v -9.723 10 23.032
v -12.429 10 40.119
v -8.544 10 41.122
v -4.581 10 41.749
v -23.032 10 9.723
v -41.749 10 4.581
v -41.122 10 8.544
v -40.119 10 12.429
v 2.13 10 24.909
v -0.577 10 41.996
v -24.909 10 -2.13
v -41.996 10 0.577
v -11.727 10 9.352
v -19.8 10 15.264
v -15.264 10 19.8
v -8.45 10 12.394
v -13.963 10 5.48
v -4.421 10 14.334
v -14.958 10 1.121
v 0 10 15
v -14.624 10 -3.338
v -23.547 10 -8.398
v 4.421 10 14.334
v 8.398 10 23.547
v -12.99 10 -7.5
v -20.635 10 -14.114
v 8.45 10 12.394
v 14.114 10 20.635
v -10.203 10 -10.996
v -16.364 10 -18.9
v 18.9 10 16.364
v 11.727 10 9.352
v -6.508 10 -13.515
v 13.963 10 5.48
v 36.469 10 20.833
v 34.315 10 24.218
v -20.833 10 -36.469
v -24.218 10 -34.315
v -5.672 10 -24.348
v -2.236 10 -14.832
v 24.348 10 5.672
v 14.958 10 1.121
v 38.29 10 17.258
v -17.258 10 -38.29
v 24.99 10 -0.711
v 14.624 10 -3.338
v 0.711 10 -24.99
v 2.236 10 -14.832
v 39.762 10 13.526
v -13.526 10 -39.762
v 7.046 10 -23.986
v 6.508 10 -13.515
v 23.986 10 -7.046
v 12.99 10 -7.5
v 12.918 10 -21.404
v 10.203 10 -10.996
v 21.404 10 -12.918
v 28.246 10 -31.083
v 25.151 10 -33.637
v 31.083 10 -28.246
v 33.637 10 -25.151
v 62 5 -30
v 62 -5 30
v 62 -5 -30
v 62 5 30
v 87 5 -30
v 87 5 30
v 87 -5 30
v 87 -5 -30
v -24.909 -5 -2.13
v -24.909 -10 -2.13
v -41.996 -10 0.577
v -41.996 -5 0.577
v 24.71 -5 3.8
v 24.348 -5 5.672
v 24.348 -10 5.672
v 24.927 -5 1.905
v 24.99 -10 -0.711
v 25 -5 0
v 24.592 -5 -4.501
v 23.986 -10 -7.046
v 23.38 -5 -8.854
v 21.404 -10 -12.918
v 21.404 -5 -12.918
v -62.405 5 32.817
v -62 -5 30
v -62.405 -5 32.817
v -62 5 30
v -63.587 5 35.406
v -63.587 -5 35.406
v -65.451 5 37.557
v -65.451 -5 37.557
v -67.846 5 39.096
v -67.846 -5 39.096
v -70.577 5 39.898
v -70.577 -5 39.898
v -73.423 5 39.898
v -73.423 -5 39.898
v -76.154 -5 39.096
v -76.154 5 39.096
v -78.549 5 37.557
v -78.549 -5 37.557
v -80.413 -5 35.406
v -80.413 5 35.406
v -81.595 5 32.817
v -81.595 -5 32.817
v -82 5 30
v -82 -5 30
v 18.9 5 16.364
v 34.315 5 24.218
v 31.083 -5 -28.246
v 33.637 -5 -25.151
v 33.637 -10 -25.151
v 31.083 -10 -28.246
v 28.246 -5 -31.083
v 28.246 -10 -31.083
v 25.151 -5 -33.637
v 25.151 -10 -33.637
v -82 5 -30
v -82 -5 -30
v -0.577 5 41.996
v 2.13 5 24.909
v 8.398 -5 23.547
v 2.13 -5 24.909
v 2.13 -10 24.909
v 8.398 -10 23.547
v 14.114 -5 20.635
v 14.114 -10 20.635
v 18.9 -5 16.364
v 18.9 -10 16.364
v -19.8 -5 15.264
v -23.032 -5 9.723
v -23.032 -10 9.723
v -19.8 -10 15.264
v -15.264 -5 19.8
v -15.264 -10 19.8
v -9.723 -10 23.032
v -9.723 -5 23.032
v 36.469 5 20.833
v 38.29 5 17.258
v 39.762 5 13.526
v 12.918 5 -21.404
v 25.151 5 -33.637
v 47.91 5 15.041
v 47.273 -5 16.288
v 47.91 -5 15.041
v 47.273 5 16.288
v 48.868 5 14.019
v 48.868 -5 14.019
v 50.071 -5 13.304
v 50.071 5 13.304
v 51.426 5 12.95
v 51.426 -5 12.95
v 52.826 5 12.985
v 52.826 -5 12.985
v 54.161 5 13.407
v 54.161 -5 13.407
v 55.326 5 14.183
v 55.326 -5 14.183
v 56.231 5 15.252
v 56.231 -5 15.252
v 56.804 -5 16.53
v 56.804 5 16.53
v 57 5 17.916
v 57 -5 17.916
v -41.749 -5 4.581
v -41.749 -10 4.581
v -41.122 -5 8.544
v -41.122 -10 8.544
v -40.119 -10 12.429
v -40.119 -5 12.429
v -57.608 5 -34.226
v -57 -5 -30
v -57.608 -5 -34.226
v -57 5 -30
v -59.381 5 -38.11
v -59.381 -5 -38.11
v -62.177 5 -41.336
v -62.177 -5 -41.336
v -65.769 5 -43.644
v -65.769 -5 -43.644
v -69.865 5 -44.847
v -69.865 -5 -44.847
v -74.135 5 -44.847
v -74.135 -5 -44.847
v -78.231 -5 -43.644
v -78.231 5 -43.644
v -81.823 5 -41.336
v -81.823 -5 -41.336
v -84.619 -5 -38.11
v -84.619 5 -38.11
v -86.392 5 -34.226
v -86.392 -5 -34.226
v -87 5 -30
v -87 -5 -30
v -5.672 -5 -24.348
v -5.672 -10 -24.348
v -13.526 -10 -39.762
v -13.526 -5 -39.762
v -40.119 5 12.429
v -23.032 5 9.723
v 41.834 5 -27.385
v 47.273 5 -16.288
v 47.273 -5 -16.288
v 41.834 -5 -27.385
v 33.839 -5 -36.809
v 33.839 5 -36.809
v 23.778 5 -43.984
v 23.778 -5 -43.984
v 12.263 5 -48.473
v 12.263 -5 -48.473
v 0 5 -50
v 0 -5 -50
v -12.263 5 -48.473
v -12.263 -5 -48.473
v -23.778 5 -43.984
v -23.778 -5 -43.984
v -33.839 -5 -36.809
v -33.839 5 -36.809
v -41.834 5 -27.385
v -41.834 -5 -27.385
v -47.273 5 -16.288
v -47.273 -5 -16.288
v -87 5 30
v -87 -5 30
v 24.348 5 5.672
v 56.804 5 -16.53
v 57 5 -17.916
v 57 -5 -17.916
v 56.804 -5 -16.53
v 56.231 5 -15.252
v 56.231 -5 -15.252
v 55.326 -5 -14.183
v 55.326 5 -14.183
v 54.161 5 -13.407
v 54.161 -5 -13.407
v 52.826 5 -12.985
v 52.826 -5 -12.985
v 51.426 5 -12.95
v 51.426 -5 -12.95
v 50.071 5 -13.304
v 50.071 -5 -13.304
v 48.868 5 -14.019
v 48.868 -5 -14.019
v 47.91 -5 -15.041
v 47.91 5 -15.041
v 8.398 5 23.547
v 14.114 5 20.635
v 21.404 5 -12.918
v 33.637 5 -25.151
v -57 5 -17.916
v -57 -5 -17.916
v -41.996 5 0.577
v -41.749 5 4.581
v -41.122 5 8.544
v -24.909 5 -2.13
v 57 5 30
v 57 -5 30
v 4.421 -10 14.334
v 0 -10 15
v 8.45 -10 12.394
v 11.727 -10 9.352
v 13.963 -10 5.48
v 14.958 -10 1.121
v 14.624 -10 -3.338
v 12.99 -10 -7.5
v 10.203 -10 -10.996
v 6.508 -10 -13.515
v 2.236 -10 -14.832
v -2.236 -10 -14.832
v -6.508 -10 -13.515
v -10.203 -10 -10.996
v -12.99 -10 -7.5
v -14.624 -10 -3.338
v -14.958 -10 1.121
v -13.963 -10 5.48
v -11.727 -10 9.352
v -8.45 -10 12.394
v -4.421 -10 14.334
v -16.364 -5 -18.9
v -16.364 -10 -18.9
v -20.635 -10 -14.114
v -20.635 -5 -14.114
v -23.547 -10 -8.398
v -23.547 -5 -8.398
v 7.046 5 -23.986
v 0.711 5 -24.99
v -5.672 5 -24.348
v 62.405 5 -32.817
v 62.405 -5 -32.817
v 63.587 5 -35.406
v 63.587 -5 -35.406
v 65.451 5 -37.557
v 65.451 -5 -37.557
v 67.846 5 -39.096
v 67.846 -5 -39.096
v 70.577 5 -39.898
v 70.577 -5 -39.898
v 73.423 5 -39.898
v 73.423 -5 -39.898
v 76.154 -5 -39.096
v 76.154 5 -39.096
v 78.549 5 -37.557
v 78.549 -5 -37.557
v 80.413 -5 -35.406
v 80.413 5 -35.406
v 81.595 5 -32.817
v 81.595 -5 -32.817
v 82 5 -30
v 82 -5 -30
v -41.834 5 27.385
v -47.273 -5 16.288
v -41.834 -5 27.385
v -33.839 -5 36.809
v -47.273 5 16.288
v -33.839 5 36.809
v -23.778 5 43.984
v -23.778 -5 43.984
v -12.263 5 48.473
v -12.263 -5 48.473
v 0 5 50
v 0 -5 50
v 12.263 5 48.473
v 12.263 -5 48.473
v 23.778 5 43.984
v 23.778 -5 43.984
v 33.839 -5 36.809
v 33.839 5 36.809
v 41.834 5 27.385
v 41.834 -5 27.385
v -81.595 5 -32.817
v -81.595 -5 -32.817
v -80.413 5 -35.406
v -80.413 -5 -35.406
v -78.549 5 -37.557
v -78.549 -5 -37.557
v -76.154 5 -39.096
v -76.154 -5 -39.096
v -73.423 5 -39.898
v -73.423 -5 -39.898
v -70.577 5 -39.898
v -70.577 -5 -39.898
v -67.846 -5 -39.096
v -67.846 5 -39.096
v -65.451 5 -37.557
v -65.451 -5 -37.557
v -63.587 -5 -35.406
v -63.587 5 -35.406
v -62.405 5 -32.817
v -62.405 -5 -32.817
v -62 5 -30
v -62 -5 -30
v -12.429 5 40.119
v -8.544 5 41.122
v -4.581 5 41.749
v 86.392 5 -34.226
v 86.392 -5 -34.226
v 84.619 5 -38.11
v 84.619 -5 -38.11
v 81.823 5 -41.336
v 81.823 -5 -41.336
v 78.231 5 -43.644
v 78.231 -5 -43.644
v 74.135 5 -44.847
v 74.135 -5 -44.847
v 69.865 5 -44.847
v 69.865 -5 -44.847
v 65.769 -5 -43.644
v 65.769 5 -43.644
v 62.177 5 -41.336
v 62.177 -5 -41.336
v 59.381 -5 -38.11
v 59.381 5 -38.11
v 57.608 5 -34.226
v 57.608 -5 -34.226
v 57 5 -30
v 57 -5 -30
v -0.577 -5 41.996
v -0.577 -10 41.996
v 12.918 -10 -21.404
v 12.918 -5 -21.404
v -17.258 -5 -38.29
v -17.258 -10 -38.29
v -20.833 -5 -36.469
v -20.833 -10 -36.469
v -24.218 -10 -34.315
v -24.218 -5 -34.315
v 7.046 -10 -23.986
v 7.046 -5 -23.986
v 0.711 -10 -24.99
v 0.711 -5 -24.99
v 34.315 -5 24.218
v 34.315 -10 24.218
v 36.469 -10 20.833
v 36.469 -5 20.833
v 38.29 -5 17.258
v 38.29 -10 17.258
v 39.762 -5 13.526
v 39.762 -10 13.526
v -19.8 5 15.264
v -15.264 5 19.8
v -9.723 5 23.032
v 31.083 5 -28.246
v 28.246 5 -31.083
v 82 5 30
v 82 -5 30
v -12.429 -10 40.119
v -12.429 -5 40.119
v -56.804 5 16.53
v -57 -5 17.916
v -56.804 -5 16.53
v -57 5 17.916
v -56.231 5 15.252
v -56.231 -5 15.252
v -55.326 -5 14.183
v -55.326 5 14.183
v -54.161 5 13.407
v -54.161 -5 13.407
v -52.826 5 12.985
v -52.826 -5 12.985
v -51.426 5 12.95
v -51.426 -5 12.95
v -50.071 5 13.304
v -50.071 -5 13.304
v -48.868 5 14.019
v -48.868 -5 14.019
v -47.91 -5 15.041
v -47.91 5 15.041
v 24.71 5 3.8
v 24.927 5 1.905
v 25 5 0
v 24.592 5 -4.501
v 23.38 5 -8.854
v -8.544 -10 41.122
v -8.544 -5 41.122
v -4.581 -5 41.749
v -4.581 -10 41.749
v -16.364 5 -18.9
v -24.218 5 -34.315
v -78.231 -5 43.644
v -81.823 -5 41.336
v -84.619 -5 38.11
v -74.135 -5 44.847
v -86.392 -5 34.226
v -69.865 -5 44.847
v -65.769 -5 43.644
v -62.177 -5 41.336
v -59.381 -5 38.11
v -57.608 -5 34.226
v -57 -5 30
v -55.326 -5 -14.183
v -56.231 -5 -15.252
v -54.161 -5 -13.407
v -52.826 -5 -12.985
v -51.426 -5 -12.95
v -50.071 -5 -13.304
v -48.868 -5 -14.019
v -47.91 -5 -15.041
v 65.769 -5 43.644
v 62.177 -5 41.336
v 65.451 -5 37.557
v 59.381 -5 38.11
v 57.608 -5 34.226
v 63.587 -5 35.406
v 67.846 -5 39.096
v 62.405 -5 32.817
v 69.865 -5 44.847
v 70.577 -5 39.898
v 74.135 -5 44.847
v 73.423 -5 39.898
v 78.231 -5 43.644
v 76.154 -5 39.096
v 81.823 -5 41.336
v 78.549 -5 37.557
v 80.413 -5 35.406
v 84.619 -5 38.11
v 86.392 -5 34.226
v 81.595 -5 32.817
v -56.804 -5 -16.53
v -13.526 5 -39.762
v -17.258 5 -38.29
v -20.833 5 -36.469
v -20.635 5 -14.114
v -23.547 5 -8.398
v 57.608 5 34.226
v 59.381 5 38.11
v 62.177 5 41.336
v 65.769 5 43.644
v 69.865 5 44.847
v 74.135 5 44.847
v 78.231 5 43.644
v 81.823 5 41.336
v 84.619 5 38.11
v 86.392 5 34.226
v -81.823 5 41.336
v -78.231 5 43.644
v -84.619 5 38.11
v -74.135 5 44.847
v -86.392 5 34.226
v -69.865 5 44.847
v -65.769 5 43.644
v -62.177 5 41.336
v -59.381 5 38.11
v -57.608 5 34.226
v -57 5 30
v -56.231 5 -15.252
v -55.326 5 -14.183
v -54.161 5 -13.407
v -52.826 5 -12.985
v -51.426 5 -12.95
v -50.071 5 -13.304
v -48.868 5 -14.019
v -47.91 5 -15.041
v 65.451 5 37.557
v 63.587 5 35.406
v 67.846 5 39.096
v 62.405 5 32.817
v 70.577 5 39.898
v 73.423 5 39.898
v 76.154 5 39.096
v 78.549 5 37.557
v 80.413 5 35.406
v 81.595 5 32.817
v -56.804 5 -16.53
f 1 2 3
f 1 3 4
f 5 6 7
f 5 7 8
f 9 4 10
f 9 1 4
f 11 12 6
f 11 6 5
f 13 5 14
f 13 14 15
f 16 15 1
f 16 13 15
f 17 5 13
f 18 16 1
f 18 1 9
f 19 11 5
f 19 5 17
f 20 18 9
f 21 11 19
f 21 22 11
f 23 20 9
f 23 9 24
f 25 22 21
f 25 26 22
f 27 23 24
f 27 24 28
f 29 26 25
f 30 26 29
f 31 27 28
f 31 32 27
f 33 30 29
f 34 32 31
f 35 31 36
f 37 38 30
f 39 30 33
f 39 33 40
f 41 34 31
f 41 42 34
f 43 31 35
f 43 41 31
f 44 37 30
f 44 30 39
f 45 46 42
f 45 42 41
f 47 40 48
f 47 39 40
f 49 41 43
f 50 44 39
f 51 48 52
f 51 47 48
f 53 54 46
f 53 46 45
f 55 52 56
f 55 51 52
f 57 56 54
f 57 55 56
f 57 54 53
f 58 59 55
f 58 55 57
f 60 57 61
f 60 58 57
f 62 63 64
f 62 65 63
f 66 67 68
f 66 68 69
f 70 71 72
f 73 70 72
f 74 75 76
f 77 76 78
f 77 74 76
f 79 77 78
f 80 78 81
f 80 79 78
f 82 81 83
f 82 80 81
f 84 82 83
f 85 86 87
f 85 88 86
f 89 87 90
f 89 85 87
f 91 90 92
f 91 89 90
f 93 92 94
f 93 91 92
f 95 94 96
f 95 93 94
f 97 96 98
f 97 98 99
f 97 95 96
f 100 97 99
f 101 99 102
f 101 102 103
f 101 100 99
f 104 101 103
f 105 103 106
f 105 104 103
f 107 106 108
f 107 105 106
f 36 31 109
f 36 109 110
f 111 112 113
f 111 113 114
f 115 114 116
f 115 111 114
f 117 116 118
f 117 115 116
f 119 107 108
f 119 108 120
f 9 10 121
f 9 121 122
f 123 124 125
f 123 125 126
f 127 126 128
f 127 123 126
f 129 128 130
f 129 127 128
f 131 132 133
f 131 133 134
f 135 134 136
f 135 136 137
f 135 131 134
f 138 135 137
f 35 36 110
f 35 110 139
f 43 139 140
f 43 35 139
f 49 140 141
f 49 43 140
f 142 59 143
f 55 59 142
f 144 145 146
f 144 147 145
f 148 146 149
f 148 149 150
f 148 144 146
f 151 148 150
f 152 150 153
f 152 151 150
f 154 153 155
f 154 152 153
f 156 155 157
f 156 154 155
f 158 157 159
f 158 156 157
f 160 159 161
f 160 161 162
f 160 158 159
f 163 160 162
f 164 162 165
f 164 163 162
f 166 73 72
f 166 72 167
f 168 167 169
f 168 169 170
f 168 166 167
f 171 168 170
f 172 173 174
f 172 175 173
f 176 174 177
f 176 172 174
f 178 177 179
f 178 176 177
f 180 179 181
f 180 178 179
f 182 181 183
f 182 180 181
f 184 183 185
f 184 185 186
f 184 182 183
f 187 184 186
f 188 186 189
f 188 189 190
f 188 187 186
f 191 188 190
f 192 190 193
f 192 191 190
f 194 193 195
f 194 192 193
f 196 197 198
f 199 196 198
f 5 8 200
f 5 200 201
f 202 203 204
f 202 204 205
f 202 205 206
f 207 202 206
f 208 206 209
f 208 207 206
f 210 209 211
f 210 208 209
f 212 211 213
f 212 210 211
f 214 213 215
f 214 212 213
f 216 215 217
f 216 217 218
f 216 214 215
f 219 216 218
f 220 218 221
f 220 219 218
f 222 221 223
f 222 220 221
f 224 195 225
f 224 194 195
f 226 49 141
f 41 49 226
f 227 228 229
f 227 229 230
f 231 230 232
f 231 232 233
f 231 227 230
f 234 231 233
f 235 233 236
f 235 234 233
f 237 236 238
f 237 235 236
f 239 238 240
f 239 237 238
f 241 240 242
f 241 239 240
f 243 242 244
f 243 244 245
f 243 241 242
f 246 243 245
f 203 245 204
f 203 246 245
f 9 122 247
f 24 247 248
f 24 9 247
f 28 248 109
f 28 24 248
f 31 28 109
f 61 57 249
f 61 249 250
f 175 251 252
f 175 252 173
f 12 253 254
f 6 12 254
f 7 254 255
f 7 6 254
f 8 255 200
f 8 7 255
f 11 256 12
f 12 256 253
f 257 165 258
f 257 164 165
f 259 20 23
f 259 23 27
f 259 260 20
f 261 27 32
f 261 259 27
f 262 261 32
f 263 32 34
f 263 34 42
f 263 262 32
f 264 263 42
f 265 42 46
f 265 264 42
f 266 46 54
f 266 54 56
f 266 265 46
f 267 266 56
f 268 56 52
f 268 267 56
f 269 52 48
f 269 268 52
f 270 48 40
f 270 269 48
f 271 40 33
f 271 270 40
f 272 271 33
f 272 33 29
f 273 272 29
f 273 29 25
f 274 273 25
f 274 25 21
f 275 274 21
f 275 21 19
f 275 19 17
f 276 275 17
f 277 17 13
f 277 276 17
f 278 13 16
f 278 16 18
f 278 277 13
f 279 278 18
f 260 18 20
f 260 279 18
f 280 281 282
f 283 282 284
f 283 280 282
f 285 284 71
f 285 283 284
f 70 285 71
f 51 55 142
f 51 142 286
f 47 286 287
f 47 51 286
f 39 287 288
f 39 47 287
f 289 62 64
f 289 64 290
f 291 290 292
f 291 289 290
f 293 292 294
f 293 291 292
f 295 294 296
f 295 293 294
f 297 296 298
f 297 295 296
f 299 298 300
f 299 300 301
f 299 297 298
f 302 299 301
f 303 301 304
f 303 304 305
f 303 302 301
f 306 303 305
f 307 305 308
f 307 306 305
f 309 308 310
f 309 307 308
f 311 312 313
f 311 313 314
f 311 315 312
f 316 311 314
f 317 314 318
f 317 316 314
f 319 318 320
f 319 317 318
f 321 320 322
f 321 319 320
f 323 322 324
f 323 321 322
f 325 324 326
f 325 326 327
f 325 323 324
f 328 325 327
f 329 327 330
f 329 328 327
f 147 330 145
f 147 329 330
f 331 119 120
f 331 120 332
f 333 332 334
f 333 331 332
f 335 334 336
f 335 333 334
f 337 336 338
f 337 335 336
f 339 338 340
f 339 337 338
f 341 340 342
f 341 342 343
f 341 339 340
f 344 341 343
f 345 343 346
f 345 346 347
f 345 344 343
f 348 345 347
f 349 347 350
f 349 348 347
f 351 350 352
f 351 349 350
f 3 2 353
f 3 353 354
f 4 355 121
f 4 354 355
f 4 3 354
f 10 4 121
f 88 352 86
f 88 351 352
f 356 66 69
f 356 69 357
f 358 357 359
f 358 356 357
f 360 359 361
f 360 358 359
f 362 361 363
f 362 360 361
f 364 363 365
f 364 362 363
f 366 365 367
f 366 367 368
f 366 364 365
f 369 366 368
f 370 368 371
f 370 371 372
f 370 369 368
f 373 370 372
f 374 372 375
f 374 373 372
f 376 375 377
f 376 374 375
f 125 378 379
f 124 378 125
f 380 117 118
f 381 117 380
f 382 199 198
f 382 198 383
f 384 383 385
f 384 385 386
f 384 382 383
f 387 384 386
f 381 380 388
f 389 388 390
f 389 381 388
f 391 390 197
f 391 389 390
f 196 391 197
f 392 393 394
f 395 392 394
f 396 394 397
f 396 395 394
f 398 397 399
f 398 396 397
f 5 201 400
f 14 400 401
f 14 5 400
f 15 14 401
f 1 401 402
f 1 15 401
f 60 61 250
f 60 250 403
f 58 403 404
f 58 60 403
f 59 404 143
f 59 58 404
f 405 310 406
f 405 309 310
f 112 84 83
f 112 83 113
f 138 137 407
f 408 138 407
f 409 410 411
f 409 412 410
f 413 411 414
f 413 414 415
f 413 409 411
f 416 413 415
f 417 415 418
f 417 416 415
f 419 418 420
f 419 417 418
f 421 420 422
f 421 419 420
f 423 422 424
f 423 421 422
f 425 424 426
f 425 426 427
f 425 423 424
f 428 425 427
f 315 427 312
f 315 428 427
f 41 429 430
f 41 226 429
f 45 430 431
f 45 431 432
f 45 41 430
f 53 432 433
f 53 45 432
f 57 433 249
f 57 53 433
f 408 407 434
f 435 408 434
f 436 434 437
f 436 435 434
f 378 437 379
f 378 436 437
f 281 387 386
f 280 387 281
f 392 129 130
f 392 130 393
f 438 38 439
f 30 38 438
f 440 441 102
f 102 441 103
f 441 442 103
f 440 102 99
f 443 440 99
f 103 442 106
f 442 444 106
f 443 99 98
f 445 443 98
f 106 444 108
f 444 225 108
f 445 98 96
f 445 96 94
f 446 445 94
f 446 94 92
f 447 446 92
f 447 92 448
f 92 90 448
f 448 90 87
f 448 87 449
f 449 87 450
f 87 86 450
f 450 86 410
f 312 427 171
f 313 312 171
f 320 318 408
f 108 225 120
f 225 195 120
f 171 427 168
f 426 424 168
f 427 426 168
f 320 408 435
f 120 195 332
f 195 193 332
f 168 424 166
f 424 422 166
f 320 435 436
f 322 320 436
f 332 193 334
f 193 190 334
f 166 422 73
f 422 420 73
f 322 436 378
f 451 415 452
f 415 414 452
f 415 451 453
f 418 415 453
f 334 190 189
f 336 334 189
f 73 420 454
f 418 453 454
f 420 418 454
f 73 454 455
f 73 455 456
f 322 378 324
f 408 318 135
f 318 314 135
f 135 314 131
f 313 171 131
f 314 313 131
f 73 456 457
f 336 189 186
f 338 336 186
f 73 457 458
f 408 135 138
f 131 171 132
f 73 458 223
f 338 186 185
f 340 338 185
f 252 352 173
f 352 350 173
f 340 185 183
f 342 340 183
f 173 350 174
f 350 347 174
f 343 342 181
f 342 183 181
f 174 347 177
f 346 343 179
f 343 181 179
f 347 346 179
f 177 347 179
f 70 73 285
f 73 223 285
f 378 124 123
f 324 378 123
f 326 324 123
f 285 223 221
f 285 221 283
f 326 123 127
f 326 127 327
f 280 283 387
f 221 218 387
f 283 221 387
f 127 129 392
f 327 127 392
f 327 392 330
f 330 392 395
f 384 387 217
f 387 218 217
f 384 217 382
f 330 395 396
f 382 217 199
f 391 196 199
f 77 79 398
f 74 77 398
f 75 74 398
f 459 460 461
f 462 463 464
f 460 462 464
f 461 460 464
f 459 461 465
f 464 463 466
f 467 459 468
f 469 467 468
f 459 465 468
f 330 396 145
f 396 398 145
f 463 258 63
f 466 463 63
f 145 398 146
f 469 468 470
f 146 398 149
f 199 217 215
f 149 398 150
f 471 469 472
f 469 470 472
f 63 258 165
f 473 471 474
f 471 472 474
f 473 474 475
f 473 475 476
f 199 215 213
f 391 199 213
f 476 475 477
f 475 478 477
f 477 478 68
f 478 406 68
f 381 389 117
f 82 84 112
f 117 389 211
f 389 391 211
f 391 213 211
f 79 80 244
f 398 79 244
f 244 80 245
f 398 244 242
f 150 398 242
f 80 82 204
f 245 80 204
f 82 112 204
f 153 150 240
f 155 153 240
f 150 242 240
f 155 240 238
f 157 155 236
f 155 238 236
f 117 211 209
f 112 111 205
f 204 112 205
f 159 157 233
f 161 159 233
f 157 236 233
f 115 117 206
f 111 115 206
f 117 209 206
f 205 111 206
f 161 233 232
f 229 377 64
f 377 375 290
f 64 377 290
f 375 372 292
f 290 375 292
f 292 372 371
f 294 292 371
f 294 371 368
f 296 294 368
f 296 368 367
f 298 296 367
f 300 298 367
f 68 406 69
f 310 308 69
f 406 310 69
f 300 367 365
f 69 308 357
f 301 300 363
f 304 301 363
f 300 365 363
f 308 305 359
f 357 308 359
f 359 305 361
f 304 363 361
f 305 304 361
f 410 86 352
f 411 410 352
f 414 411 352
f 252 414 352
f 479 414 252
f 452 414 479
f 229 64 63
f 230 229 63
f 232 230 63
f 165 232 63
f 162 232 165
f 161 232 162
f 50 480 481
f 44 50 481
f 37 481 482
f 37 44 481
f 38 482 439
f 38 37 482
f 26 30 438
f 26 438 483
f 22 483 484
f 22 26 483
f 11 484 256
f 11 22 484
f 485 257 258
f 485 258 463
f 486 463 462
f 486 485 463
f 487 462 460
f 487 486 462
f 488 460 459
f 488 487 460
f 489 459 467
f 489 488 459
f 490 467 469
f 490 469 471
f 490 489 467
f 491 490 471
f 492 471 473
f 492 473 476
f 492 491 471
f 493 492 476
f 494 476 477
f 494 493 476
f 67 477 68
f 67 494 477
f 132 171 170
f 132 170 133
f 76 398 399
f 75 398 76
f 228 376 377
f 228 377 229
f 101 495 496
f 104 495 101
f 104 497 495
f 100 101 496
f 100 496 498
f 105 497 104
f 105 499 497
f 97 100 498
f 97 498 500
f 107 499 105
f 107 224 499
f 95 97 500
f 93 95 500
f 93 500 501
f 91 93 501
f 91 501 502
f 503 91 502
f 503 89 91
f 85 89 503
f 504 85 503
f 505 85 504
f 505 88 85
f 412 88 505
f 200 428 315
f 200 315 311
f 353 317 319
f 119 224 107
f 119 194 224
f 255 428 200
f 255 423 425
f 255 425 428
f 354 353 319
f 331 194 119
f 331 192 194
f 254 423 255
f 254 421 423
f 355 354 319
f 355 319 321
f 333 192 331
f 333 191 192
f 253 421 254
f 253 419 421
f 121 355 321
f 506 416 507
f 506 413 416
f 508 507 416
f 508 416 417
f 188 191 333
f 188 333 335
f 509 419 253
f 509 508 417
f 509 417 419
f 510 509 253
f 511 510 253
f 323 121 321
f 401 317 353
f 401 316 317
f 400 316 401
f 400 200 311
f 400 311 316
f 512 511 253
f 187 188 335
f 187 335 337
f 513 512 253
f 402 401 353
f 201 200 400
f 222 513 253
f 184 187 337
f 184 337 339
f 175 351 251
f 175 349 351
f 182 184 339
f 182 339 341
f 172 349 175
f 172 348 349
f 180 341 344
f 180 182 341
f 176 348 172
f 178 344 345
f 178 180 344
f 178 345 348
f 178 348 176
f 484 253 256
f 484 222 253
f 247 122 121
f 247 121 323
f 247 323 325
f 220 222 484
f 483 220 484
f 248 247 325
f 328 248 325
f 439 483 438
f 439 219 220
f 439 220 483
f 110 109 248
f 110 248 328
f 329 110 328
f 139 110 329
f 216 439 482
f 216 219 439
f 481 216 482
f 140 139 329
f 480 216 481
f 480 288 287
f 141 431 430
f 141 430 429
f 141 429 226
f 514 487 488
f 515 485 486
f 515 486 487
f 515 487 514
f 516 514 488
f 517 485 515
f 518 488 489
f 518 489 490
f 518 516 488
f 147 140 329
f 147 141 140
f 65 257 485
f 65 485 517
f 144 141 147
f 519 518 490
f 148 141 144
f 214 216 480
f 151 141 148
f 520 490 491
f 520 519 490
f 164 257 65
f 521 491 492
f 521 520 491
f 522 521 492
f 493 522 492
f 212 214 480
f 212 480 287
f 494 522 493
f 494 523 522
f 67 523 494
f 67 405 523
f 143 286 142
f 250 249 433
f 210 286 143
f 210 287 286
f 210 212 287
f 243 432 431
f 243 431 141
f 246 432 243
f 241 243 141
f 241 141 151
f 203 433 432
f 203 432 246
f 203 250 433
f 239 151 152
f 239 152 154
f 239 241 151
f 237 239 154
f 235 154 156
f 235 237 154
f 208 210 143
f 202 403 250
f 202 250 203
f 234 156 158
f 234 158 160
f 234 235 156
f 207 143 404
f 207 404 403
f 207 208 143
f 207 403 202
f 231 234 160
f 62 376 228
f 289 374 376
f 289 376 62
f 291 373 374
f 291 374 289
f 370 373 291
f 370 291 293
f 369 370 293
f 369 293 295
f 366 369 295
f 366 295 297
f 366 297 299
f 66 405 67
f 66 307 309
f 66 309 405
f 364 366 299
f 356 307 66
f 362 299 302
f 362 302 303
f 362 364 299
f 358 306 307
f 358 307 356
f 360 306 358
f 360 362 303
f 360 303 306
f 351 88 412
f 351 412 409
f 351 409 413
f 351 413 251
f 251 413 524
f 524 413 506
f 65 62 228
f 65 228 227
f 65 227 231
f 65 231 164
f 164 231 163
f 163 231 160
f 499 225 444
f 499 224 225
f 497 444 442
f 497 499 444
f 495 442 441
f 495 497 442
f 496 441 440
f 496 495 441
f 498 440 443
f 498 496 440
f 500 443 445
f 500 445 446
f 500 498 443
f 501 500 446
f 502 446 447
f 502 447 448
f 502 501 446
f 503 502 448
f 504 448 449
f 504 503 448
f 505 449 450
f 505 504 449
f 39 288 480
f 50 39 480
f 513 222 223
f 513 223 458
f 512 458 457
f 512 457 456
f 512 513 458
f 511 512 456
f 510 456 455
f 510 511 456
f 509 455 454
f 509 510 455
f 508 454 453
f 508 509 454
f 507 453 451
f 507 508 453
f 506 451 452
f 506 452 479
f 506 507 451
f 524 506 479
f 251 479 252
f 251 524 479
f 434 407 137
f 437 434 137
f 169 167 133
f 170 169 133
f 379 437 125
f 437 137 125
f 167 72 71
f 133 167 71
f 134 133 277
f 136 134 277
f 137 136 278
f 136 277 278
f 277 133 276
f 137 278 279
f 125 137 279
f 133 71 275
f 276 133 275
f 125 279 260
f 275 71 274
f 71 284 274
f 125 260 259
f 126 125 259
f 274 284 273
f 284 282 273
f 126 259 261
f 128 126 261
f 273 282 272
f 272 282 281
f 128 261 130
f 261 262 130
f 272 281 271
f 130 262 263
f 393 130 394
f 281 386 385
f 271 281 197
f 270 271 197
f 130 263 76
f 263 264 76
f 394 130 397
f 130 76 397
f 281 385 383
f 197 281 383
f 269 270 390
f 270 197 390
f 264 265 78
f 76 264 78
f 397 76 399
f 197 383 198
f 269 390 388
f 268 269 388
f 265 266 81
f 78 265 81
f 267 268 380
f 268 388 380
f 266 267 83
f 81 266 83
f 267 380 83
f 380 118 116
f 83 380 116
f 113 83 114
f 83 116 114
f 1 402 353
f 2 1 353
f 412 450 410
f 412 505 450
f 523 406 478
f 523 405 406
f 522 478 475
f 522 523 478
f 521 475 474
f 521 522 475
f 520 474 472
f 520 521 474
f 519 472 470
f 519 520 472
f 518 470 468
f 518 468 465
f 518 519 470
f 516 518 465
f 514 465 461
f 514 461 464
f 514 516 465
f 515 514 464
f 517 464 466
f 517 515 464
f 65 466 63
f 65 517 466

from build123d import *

# Parameters (mm, degrees)
SKETCH1_R           = 15
BOSS_EXTRUDE1_DEPTH = 10
BOSS_EXTRUDE2_DEPTH = 5


with BuildPart() as part:
    # Sketch1 → Boss-Extrude1 (new, symmetric)
    with BuildSketch(Plane(origin=(0, 0, 0), x_dir=(1, 0, 0), z_dir=(0, 1, 0))):
        with BuildLine():
            Line((25.151236226, 33.636517601), (12.918361615, 21.403642989))
            ThreePointArc((12.918361615, 21.403642989), (3.910861626, 24.692208515), (-5.672002568, 24.348067415))
            Line((-5.672002568, 24.348067415), (-13.525991536, 39.762388673))
            ThreePointArc((-13.525991536, 39.762388673), (-19.067600989, 37.422274016), (-24.218069826, 34.314502676))
            Line((-24.218069826, 34.314502676), (-16.364080859, 18.900181419))
            ThreePointArc((-16.364080859, 18.900181419), (-22.275163105, 11.349762493), (-24.90913336, 2.129571608))
            Line((-24.90913336, 2.129571608), (-41.996040101, -0.576728553))
            ThreePointArc((-41.996040101, -0.576728553), (-41.482910305, -6.570247532), (-40.118826521, -12.42898864))
            Line((-40.118826521, -12.42898864), (-23.03191978, -9.722688479))
            ThreePointArc((-23.03191978, -9.722688479), (-17.67766953, -17.67766953), (-9.722688479, -23.03191978))
            Line((-9.722688479, -23.03191978), (-12.42898864, -40.118826521))
            ThreePointArc((-12.42898864, -40.118826521), (-6.570247532, -41.482910305), (-0.576728553, -41.996040101))
            Line((-0.576728553, -41.996040101), (2.129571608, -24.90913336))
            ThreePointArc((2.129571608, -24.90913336), (11.349762493, -22.275163105), (18.900181419, -16.364080859))
            Line((18.900181419, -16.364080859), (34.314502676, -24.218069826))
            ThreePointArc((34.314502676, -24.218069826), (37.422274016, -19.067600989), (39.762388673, -13.525991536))
            Line((39.762388673, -13.525991536), (24.348067415, -5.672002568))
            ThreePointArc((24.348067415, -5.672002568), (24.692208515, 3.910861626), (21.403642989, 12.918361615))
            Line((21.403642989, 12.918361615), (33.636517601, 25.151236226))
            ThreePointArc((33.636517601, 25.151236226), (29.69848481, 29.69848481), (25.151236226, 33.636517601))
        make_face()
        Circle(SKETCH1_R, mode=Mode.SUBTRACT)
    extrude(amount=BOSS_EXTRUDE1_DEPTH, both=True)

    # Sketch1<3> → Boss-Extrude2 (add, symmetric)
    with BuildSketch(Plane(origin=(0, 0, 0), x_dir=(1, 0, 0), z_dir=(0, 1, 0))):
        with BuildLine():
            Line((57, -17.916472867), (57, -30))
            ThreePointArc((57, -30), (72, -45), (87, -30))
            Line((87, -30), (87, 30))
            ThreePointArc((87, 30), (72, 45), (57, 30))
            Line((57, 30), (57, 17.916472867))
            ThreePointArc((57, 17.916472867), (52.825722824, 12.985126011), (47.272727273, 16.287702607))
            ThreePointArc((47.272727273, 16.287702607), (0, 50), (-47.272727273, 16.287702607))
            ThreePointArc((-47.272727273, 16.287702607), (-52.825722824, 12.985126011), (-57, 17.916472867))
            Line((-57, 17.916472867), (-57, 30))
            ThreePointArc((-57, 30), (-72, 45), (-87, 30))
            Line((-87, 30), (-87, -30))
            ThreePointArc((-87, -30), (-72, -45), (-57, -30))
            Line((-57, -30), (-57, -17.916472867))
            ThreePointArc((-57, -17.916472867), (-52.825722824, -12.985126011), (-47.272727273, -16.287702607))
            ThreePointArc((-47.272727273, -16.287702607), (0, -50), (47.272727273, -16.287702607))
            ThreePointArc((47.272727273, -16.287702607), (52.825722824, -12.985126011), (57, -17.916472867))
        make_face()
        with BuildLine():
            Line((-82, -30), (-82, 30))
            ThreePointArc((-82, 30), (-72, 40), (-62, 30))
            Line((-62, 30), (-62, -30))
            ThreePointArc((-62, -30), (-72, -40), (-82, -30))
        make_face(mode=Mode.SUBTRACT)
        with BuildLine():
            Line((33.636517601, 25.151236226), (21.403642989, 12.918361615))
            ThreePointArc((21.403642989, 12.918361615), (24.084134557, 6.704808919), (25, 0))
            ThreePointArc((25, 0), (24.836482092, -2.85467289), (24.348067415, -5.672002568))
            Line((24.348067415, -5.672002568), (39.762388673, -13.525991536))
            ThreePointArc((39.762388673, -13.525991536), (37.422274016, -19.067600989), (34.314502676, -24.218069826))
            Line((34.314502676, -24.218069826), (18.900181419, -16.364080859))
            ThreePointArc((18.900181419, -16.364080859), (11.349762493, -22.275163105), (2.129571608, -24.90913336))
            Line((2.129571608, -24.90913336), (-0.576728553, -41.996040101))
            ThreePointArc((-0.576728553, -41.996040101), (-6.570247532, -41.482910305), (-12.42898864, -40.118826521))
            Line((-12.42898864, -40.118826521), (-9.722688479, -23.03191978))
            ThreePointArc((-9.722688479, -23.03191978), (-17.67766953, -17.67766953), (-23.03191978, -9.722688479))
            Line((-23.03191978, -9.722688479), (-40.118826521, -12.42898864))
            ThreePointArc((-40.118826521, -12.42898864), (-41.482910305, -6.570247532), (-41.996040101, -0.576728553))
            Line((-41.996040101, -0.576728553), (-24.90913336, 2.129571608))
            ThreePointArc((-24.90913336, 2.129571608), (-22.275163105, 11.349762493), (-16.364080859, 18.900181419))
            Line((-16.364080859, 18.900181419), (-24.218069826, 34.314502676))
            ThreePointArc((-24.218069826, 34.314502676), (-19.067600989, 37.422274016), (-13.525991536, 39.762388673))
            Line((-13.525991536, 39.762388673), (-5.672002568, 24.348067415))
            ThreePointArc((-5.672002568, 24.348067415), (3.910861626, 24.692208515), (12.918361615, 21.403642989))
            Line((12.918361615, 21.403642989), (25.151236226, 33.636517601))
            ThreePointArc((25.151236226, 33.636517601), (29.69848481, 29.69848481), (33.636517601, 25.151236226))
        make_face(mode=Mode.SUBTRACT)
        with BuildLine():
            ThreePointArc((62, 30), (72, 40), (82, 30))
            Line((82, 30), (82, -30))
            ThreePointArc((82, -30), (72, -40), (62, -30))
            Line((62, -30), (62, 30))
        make_face(mode=Mode.SUBTRACT)
    extrude(amount=BOSS_EXTRUDE2_DEPTH, both=True)


solid = part.part
